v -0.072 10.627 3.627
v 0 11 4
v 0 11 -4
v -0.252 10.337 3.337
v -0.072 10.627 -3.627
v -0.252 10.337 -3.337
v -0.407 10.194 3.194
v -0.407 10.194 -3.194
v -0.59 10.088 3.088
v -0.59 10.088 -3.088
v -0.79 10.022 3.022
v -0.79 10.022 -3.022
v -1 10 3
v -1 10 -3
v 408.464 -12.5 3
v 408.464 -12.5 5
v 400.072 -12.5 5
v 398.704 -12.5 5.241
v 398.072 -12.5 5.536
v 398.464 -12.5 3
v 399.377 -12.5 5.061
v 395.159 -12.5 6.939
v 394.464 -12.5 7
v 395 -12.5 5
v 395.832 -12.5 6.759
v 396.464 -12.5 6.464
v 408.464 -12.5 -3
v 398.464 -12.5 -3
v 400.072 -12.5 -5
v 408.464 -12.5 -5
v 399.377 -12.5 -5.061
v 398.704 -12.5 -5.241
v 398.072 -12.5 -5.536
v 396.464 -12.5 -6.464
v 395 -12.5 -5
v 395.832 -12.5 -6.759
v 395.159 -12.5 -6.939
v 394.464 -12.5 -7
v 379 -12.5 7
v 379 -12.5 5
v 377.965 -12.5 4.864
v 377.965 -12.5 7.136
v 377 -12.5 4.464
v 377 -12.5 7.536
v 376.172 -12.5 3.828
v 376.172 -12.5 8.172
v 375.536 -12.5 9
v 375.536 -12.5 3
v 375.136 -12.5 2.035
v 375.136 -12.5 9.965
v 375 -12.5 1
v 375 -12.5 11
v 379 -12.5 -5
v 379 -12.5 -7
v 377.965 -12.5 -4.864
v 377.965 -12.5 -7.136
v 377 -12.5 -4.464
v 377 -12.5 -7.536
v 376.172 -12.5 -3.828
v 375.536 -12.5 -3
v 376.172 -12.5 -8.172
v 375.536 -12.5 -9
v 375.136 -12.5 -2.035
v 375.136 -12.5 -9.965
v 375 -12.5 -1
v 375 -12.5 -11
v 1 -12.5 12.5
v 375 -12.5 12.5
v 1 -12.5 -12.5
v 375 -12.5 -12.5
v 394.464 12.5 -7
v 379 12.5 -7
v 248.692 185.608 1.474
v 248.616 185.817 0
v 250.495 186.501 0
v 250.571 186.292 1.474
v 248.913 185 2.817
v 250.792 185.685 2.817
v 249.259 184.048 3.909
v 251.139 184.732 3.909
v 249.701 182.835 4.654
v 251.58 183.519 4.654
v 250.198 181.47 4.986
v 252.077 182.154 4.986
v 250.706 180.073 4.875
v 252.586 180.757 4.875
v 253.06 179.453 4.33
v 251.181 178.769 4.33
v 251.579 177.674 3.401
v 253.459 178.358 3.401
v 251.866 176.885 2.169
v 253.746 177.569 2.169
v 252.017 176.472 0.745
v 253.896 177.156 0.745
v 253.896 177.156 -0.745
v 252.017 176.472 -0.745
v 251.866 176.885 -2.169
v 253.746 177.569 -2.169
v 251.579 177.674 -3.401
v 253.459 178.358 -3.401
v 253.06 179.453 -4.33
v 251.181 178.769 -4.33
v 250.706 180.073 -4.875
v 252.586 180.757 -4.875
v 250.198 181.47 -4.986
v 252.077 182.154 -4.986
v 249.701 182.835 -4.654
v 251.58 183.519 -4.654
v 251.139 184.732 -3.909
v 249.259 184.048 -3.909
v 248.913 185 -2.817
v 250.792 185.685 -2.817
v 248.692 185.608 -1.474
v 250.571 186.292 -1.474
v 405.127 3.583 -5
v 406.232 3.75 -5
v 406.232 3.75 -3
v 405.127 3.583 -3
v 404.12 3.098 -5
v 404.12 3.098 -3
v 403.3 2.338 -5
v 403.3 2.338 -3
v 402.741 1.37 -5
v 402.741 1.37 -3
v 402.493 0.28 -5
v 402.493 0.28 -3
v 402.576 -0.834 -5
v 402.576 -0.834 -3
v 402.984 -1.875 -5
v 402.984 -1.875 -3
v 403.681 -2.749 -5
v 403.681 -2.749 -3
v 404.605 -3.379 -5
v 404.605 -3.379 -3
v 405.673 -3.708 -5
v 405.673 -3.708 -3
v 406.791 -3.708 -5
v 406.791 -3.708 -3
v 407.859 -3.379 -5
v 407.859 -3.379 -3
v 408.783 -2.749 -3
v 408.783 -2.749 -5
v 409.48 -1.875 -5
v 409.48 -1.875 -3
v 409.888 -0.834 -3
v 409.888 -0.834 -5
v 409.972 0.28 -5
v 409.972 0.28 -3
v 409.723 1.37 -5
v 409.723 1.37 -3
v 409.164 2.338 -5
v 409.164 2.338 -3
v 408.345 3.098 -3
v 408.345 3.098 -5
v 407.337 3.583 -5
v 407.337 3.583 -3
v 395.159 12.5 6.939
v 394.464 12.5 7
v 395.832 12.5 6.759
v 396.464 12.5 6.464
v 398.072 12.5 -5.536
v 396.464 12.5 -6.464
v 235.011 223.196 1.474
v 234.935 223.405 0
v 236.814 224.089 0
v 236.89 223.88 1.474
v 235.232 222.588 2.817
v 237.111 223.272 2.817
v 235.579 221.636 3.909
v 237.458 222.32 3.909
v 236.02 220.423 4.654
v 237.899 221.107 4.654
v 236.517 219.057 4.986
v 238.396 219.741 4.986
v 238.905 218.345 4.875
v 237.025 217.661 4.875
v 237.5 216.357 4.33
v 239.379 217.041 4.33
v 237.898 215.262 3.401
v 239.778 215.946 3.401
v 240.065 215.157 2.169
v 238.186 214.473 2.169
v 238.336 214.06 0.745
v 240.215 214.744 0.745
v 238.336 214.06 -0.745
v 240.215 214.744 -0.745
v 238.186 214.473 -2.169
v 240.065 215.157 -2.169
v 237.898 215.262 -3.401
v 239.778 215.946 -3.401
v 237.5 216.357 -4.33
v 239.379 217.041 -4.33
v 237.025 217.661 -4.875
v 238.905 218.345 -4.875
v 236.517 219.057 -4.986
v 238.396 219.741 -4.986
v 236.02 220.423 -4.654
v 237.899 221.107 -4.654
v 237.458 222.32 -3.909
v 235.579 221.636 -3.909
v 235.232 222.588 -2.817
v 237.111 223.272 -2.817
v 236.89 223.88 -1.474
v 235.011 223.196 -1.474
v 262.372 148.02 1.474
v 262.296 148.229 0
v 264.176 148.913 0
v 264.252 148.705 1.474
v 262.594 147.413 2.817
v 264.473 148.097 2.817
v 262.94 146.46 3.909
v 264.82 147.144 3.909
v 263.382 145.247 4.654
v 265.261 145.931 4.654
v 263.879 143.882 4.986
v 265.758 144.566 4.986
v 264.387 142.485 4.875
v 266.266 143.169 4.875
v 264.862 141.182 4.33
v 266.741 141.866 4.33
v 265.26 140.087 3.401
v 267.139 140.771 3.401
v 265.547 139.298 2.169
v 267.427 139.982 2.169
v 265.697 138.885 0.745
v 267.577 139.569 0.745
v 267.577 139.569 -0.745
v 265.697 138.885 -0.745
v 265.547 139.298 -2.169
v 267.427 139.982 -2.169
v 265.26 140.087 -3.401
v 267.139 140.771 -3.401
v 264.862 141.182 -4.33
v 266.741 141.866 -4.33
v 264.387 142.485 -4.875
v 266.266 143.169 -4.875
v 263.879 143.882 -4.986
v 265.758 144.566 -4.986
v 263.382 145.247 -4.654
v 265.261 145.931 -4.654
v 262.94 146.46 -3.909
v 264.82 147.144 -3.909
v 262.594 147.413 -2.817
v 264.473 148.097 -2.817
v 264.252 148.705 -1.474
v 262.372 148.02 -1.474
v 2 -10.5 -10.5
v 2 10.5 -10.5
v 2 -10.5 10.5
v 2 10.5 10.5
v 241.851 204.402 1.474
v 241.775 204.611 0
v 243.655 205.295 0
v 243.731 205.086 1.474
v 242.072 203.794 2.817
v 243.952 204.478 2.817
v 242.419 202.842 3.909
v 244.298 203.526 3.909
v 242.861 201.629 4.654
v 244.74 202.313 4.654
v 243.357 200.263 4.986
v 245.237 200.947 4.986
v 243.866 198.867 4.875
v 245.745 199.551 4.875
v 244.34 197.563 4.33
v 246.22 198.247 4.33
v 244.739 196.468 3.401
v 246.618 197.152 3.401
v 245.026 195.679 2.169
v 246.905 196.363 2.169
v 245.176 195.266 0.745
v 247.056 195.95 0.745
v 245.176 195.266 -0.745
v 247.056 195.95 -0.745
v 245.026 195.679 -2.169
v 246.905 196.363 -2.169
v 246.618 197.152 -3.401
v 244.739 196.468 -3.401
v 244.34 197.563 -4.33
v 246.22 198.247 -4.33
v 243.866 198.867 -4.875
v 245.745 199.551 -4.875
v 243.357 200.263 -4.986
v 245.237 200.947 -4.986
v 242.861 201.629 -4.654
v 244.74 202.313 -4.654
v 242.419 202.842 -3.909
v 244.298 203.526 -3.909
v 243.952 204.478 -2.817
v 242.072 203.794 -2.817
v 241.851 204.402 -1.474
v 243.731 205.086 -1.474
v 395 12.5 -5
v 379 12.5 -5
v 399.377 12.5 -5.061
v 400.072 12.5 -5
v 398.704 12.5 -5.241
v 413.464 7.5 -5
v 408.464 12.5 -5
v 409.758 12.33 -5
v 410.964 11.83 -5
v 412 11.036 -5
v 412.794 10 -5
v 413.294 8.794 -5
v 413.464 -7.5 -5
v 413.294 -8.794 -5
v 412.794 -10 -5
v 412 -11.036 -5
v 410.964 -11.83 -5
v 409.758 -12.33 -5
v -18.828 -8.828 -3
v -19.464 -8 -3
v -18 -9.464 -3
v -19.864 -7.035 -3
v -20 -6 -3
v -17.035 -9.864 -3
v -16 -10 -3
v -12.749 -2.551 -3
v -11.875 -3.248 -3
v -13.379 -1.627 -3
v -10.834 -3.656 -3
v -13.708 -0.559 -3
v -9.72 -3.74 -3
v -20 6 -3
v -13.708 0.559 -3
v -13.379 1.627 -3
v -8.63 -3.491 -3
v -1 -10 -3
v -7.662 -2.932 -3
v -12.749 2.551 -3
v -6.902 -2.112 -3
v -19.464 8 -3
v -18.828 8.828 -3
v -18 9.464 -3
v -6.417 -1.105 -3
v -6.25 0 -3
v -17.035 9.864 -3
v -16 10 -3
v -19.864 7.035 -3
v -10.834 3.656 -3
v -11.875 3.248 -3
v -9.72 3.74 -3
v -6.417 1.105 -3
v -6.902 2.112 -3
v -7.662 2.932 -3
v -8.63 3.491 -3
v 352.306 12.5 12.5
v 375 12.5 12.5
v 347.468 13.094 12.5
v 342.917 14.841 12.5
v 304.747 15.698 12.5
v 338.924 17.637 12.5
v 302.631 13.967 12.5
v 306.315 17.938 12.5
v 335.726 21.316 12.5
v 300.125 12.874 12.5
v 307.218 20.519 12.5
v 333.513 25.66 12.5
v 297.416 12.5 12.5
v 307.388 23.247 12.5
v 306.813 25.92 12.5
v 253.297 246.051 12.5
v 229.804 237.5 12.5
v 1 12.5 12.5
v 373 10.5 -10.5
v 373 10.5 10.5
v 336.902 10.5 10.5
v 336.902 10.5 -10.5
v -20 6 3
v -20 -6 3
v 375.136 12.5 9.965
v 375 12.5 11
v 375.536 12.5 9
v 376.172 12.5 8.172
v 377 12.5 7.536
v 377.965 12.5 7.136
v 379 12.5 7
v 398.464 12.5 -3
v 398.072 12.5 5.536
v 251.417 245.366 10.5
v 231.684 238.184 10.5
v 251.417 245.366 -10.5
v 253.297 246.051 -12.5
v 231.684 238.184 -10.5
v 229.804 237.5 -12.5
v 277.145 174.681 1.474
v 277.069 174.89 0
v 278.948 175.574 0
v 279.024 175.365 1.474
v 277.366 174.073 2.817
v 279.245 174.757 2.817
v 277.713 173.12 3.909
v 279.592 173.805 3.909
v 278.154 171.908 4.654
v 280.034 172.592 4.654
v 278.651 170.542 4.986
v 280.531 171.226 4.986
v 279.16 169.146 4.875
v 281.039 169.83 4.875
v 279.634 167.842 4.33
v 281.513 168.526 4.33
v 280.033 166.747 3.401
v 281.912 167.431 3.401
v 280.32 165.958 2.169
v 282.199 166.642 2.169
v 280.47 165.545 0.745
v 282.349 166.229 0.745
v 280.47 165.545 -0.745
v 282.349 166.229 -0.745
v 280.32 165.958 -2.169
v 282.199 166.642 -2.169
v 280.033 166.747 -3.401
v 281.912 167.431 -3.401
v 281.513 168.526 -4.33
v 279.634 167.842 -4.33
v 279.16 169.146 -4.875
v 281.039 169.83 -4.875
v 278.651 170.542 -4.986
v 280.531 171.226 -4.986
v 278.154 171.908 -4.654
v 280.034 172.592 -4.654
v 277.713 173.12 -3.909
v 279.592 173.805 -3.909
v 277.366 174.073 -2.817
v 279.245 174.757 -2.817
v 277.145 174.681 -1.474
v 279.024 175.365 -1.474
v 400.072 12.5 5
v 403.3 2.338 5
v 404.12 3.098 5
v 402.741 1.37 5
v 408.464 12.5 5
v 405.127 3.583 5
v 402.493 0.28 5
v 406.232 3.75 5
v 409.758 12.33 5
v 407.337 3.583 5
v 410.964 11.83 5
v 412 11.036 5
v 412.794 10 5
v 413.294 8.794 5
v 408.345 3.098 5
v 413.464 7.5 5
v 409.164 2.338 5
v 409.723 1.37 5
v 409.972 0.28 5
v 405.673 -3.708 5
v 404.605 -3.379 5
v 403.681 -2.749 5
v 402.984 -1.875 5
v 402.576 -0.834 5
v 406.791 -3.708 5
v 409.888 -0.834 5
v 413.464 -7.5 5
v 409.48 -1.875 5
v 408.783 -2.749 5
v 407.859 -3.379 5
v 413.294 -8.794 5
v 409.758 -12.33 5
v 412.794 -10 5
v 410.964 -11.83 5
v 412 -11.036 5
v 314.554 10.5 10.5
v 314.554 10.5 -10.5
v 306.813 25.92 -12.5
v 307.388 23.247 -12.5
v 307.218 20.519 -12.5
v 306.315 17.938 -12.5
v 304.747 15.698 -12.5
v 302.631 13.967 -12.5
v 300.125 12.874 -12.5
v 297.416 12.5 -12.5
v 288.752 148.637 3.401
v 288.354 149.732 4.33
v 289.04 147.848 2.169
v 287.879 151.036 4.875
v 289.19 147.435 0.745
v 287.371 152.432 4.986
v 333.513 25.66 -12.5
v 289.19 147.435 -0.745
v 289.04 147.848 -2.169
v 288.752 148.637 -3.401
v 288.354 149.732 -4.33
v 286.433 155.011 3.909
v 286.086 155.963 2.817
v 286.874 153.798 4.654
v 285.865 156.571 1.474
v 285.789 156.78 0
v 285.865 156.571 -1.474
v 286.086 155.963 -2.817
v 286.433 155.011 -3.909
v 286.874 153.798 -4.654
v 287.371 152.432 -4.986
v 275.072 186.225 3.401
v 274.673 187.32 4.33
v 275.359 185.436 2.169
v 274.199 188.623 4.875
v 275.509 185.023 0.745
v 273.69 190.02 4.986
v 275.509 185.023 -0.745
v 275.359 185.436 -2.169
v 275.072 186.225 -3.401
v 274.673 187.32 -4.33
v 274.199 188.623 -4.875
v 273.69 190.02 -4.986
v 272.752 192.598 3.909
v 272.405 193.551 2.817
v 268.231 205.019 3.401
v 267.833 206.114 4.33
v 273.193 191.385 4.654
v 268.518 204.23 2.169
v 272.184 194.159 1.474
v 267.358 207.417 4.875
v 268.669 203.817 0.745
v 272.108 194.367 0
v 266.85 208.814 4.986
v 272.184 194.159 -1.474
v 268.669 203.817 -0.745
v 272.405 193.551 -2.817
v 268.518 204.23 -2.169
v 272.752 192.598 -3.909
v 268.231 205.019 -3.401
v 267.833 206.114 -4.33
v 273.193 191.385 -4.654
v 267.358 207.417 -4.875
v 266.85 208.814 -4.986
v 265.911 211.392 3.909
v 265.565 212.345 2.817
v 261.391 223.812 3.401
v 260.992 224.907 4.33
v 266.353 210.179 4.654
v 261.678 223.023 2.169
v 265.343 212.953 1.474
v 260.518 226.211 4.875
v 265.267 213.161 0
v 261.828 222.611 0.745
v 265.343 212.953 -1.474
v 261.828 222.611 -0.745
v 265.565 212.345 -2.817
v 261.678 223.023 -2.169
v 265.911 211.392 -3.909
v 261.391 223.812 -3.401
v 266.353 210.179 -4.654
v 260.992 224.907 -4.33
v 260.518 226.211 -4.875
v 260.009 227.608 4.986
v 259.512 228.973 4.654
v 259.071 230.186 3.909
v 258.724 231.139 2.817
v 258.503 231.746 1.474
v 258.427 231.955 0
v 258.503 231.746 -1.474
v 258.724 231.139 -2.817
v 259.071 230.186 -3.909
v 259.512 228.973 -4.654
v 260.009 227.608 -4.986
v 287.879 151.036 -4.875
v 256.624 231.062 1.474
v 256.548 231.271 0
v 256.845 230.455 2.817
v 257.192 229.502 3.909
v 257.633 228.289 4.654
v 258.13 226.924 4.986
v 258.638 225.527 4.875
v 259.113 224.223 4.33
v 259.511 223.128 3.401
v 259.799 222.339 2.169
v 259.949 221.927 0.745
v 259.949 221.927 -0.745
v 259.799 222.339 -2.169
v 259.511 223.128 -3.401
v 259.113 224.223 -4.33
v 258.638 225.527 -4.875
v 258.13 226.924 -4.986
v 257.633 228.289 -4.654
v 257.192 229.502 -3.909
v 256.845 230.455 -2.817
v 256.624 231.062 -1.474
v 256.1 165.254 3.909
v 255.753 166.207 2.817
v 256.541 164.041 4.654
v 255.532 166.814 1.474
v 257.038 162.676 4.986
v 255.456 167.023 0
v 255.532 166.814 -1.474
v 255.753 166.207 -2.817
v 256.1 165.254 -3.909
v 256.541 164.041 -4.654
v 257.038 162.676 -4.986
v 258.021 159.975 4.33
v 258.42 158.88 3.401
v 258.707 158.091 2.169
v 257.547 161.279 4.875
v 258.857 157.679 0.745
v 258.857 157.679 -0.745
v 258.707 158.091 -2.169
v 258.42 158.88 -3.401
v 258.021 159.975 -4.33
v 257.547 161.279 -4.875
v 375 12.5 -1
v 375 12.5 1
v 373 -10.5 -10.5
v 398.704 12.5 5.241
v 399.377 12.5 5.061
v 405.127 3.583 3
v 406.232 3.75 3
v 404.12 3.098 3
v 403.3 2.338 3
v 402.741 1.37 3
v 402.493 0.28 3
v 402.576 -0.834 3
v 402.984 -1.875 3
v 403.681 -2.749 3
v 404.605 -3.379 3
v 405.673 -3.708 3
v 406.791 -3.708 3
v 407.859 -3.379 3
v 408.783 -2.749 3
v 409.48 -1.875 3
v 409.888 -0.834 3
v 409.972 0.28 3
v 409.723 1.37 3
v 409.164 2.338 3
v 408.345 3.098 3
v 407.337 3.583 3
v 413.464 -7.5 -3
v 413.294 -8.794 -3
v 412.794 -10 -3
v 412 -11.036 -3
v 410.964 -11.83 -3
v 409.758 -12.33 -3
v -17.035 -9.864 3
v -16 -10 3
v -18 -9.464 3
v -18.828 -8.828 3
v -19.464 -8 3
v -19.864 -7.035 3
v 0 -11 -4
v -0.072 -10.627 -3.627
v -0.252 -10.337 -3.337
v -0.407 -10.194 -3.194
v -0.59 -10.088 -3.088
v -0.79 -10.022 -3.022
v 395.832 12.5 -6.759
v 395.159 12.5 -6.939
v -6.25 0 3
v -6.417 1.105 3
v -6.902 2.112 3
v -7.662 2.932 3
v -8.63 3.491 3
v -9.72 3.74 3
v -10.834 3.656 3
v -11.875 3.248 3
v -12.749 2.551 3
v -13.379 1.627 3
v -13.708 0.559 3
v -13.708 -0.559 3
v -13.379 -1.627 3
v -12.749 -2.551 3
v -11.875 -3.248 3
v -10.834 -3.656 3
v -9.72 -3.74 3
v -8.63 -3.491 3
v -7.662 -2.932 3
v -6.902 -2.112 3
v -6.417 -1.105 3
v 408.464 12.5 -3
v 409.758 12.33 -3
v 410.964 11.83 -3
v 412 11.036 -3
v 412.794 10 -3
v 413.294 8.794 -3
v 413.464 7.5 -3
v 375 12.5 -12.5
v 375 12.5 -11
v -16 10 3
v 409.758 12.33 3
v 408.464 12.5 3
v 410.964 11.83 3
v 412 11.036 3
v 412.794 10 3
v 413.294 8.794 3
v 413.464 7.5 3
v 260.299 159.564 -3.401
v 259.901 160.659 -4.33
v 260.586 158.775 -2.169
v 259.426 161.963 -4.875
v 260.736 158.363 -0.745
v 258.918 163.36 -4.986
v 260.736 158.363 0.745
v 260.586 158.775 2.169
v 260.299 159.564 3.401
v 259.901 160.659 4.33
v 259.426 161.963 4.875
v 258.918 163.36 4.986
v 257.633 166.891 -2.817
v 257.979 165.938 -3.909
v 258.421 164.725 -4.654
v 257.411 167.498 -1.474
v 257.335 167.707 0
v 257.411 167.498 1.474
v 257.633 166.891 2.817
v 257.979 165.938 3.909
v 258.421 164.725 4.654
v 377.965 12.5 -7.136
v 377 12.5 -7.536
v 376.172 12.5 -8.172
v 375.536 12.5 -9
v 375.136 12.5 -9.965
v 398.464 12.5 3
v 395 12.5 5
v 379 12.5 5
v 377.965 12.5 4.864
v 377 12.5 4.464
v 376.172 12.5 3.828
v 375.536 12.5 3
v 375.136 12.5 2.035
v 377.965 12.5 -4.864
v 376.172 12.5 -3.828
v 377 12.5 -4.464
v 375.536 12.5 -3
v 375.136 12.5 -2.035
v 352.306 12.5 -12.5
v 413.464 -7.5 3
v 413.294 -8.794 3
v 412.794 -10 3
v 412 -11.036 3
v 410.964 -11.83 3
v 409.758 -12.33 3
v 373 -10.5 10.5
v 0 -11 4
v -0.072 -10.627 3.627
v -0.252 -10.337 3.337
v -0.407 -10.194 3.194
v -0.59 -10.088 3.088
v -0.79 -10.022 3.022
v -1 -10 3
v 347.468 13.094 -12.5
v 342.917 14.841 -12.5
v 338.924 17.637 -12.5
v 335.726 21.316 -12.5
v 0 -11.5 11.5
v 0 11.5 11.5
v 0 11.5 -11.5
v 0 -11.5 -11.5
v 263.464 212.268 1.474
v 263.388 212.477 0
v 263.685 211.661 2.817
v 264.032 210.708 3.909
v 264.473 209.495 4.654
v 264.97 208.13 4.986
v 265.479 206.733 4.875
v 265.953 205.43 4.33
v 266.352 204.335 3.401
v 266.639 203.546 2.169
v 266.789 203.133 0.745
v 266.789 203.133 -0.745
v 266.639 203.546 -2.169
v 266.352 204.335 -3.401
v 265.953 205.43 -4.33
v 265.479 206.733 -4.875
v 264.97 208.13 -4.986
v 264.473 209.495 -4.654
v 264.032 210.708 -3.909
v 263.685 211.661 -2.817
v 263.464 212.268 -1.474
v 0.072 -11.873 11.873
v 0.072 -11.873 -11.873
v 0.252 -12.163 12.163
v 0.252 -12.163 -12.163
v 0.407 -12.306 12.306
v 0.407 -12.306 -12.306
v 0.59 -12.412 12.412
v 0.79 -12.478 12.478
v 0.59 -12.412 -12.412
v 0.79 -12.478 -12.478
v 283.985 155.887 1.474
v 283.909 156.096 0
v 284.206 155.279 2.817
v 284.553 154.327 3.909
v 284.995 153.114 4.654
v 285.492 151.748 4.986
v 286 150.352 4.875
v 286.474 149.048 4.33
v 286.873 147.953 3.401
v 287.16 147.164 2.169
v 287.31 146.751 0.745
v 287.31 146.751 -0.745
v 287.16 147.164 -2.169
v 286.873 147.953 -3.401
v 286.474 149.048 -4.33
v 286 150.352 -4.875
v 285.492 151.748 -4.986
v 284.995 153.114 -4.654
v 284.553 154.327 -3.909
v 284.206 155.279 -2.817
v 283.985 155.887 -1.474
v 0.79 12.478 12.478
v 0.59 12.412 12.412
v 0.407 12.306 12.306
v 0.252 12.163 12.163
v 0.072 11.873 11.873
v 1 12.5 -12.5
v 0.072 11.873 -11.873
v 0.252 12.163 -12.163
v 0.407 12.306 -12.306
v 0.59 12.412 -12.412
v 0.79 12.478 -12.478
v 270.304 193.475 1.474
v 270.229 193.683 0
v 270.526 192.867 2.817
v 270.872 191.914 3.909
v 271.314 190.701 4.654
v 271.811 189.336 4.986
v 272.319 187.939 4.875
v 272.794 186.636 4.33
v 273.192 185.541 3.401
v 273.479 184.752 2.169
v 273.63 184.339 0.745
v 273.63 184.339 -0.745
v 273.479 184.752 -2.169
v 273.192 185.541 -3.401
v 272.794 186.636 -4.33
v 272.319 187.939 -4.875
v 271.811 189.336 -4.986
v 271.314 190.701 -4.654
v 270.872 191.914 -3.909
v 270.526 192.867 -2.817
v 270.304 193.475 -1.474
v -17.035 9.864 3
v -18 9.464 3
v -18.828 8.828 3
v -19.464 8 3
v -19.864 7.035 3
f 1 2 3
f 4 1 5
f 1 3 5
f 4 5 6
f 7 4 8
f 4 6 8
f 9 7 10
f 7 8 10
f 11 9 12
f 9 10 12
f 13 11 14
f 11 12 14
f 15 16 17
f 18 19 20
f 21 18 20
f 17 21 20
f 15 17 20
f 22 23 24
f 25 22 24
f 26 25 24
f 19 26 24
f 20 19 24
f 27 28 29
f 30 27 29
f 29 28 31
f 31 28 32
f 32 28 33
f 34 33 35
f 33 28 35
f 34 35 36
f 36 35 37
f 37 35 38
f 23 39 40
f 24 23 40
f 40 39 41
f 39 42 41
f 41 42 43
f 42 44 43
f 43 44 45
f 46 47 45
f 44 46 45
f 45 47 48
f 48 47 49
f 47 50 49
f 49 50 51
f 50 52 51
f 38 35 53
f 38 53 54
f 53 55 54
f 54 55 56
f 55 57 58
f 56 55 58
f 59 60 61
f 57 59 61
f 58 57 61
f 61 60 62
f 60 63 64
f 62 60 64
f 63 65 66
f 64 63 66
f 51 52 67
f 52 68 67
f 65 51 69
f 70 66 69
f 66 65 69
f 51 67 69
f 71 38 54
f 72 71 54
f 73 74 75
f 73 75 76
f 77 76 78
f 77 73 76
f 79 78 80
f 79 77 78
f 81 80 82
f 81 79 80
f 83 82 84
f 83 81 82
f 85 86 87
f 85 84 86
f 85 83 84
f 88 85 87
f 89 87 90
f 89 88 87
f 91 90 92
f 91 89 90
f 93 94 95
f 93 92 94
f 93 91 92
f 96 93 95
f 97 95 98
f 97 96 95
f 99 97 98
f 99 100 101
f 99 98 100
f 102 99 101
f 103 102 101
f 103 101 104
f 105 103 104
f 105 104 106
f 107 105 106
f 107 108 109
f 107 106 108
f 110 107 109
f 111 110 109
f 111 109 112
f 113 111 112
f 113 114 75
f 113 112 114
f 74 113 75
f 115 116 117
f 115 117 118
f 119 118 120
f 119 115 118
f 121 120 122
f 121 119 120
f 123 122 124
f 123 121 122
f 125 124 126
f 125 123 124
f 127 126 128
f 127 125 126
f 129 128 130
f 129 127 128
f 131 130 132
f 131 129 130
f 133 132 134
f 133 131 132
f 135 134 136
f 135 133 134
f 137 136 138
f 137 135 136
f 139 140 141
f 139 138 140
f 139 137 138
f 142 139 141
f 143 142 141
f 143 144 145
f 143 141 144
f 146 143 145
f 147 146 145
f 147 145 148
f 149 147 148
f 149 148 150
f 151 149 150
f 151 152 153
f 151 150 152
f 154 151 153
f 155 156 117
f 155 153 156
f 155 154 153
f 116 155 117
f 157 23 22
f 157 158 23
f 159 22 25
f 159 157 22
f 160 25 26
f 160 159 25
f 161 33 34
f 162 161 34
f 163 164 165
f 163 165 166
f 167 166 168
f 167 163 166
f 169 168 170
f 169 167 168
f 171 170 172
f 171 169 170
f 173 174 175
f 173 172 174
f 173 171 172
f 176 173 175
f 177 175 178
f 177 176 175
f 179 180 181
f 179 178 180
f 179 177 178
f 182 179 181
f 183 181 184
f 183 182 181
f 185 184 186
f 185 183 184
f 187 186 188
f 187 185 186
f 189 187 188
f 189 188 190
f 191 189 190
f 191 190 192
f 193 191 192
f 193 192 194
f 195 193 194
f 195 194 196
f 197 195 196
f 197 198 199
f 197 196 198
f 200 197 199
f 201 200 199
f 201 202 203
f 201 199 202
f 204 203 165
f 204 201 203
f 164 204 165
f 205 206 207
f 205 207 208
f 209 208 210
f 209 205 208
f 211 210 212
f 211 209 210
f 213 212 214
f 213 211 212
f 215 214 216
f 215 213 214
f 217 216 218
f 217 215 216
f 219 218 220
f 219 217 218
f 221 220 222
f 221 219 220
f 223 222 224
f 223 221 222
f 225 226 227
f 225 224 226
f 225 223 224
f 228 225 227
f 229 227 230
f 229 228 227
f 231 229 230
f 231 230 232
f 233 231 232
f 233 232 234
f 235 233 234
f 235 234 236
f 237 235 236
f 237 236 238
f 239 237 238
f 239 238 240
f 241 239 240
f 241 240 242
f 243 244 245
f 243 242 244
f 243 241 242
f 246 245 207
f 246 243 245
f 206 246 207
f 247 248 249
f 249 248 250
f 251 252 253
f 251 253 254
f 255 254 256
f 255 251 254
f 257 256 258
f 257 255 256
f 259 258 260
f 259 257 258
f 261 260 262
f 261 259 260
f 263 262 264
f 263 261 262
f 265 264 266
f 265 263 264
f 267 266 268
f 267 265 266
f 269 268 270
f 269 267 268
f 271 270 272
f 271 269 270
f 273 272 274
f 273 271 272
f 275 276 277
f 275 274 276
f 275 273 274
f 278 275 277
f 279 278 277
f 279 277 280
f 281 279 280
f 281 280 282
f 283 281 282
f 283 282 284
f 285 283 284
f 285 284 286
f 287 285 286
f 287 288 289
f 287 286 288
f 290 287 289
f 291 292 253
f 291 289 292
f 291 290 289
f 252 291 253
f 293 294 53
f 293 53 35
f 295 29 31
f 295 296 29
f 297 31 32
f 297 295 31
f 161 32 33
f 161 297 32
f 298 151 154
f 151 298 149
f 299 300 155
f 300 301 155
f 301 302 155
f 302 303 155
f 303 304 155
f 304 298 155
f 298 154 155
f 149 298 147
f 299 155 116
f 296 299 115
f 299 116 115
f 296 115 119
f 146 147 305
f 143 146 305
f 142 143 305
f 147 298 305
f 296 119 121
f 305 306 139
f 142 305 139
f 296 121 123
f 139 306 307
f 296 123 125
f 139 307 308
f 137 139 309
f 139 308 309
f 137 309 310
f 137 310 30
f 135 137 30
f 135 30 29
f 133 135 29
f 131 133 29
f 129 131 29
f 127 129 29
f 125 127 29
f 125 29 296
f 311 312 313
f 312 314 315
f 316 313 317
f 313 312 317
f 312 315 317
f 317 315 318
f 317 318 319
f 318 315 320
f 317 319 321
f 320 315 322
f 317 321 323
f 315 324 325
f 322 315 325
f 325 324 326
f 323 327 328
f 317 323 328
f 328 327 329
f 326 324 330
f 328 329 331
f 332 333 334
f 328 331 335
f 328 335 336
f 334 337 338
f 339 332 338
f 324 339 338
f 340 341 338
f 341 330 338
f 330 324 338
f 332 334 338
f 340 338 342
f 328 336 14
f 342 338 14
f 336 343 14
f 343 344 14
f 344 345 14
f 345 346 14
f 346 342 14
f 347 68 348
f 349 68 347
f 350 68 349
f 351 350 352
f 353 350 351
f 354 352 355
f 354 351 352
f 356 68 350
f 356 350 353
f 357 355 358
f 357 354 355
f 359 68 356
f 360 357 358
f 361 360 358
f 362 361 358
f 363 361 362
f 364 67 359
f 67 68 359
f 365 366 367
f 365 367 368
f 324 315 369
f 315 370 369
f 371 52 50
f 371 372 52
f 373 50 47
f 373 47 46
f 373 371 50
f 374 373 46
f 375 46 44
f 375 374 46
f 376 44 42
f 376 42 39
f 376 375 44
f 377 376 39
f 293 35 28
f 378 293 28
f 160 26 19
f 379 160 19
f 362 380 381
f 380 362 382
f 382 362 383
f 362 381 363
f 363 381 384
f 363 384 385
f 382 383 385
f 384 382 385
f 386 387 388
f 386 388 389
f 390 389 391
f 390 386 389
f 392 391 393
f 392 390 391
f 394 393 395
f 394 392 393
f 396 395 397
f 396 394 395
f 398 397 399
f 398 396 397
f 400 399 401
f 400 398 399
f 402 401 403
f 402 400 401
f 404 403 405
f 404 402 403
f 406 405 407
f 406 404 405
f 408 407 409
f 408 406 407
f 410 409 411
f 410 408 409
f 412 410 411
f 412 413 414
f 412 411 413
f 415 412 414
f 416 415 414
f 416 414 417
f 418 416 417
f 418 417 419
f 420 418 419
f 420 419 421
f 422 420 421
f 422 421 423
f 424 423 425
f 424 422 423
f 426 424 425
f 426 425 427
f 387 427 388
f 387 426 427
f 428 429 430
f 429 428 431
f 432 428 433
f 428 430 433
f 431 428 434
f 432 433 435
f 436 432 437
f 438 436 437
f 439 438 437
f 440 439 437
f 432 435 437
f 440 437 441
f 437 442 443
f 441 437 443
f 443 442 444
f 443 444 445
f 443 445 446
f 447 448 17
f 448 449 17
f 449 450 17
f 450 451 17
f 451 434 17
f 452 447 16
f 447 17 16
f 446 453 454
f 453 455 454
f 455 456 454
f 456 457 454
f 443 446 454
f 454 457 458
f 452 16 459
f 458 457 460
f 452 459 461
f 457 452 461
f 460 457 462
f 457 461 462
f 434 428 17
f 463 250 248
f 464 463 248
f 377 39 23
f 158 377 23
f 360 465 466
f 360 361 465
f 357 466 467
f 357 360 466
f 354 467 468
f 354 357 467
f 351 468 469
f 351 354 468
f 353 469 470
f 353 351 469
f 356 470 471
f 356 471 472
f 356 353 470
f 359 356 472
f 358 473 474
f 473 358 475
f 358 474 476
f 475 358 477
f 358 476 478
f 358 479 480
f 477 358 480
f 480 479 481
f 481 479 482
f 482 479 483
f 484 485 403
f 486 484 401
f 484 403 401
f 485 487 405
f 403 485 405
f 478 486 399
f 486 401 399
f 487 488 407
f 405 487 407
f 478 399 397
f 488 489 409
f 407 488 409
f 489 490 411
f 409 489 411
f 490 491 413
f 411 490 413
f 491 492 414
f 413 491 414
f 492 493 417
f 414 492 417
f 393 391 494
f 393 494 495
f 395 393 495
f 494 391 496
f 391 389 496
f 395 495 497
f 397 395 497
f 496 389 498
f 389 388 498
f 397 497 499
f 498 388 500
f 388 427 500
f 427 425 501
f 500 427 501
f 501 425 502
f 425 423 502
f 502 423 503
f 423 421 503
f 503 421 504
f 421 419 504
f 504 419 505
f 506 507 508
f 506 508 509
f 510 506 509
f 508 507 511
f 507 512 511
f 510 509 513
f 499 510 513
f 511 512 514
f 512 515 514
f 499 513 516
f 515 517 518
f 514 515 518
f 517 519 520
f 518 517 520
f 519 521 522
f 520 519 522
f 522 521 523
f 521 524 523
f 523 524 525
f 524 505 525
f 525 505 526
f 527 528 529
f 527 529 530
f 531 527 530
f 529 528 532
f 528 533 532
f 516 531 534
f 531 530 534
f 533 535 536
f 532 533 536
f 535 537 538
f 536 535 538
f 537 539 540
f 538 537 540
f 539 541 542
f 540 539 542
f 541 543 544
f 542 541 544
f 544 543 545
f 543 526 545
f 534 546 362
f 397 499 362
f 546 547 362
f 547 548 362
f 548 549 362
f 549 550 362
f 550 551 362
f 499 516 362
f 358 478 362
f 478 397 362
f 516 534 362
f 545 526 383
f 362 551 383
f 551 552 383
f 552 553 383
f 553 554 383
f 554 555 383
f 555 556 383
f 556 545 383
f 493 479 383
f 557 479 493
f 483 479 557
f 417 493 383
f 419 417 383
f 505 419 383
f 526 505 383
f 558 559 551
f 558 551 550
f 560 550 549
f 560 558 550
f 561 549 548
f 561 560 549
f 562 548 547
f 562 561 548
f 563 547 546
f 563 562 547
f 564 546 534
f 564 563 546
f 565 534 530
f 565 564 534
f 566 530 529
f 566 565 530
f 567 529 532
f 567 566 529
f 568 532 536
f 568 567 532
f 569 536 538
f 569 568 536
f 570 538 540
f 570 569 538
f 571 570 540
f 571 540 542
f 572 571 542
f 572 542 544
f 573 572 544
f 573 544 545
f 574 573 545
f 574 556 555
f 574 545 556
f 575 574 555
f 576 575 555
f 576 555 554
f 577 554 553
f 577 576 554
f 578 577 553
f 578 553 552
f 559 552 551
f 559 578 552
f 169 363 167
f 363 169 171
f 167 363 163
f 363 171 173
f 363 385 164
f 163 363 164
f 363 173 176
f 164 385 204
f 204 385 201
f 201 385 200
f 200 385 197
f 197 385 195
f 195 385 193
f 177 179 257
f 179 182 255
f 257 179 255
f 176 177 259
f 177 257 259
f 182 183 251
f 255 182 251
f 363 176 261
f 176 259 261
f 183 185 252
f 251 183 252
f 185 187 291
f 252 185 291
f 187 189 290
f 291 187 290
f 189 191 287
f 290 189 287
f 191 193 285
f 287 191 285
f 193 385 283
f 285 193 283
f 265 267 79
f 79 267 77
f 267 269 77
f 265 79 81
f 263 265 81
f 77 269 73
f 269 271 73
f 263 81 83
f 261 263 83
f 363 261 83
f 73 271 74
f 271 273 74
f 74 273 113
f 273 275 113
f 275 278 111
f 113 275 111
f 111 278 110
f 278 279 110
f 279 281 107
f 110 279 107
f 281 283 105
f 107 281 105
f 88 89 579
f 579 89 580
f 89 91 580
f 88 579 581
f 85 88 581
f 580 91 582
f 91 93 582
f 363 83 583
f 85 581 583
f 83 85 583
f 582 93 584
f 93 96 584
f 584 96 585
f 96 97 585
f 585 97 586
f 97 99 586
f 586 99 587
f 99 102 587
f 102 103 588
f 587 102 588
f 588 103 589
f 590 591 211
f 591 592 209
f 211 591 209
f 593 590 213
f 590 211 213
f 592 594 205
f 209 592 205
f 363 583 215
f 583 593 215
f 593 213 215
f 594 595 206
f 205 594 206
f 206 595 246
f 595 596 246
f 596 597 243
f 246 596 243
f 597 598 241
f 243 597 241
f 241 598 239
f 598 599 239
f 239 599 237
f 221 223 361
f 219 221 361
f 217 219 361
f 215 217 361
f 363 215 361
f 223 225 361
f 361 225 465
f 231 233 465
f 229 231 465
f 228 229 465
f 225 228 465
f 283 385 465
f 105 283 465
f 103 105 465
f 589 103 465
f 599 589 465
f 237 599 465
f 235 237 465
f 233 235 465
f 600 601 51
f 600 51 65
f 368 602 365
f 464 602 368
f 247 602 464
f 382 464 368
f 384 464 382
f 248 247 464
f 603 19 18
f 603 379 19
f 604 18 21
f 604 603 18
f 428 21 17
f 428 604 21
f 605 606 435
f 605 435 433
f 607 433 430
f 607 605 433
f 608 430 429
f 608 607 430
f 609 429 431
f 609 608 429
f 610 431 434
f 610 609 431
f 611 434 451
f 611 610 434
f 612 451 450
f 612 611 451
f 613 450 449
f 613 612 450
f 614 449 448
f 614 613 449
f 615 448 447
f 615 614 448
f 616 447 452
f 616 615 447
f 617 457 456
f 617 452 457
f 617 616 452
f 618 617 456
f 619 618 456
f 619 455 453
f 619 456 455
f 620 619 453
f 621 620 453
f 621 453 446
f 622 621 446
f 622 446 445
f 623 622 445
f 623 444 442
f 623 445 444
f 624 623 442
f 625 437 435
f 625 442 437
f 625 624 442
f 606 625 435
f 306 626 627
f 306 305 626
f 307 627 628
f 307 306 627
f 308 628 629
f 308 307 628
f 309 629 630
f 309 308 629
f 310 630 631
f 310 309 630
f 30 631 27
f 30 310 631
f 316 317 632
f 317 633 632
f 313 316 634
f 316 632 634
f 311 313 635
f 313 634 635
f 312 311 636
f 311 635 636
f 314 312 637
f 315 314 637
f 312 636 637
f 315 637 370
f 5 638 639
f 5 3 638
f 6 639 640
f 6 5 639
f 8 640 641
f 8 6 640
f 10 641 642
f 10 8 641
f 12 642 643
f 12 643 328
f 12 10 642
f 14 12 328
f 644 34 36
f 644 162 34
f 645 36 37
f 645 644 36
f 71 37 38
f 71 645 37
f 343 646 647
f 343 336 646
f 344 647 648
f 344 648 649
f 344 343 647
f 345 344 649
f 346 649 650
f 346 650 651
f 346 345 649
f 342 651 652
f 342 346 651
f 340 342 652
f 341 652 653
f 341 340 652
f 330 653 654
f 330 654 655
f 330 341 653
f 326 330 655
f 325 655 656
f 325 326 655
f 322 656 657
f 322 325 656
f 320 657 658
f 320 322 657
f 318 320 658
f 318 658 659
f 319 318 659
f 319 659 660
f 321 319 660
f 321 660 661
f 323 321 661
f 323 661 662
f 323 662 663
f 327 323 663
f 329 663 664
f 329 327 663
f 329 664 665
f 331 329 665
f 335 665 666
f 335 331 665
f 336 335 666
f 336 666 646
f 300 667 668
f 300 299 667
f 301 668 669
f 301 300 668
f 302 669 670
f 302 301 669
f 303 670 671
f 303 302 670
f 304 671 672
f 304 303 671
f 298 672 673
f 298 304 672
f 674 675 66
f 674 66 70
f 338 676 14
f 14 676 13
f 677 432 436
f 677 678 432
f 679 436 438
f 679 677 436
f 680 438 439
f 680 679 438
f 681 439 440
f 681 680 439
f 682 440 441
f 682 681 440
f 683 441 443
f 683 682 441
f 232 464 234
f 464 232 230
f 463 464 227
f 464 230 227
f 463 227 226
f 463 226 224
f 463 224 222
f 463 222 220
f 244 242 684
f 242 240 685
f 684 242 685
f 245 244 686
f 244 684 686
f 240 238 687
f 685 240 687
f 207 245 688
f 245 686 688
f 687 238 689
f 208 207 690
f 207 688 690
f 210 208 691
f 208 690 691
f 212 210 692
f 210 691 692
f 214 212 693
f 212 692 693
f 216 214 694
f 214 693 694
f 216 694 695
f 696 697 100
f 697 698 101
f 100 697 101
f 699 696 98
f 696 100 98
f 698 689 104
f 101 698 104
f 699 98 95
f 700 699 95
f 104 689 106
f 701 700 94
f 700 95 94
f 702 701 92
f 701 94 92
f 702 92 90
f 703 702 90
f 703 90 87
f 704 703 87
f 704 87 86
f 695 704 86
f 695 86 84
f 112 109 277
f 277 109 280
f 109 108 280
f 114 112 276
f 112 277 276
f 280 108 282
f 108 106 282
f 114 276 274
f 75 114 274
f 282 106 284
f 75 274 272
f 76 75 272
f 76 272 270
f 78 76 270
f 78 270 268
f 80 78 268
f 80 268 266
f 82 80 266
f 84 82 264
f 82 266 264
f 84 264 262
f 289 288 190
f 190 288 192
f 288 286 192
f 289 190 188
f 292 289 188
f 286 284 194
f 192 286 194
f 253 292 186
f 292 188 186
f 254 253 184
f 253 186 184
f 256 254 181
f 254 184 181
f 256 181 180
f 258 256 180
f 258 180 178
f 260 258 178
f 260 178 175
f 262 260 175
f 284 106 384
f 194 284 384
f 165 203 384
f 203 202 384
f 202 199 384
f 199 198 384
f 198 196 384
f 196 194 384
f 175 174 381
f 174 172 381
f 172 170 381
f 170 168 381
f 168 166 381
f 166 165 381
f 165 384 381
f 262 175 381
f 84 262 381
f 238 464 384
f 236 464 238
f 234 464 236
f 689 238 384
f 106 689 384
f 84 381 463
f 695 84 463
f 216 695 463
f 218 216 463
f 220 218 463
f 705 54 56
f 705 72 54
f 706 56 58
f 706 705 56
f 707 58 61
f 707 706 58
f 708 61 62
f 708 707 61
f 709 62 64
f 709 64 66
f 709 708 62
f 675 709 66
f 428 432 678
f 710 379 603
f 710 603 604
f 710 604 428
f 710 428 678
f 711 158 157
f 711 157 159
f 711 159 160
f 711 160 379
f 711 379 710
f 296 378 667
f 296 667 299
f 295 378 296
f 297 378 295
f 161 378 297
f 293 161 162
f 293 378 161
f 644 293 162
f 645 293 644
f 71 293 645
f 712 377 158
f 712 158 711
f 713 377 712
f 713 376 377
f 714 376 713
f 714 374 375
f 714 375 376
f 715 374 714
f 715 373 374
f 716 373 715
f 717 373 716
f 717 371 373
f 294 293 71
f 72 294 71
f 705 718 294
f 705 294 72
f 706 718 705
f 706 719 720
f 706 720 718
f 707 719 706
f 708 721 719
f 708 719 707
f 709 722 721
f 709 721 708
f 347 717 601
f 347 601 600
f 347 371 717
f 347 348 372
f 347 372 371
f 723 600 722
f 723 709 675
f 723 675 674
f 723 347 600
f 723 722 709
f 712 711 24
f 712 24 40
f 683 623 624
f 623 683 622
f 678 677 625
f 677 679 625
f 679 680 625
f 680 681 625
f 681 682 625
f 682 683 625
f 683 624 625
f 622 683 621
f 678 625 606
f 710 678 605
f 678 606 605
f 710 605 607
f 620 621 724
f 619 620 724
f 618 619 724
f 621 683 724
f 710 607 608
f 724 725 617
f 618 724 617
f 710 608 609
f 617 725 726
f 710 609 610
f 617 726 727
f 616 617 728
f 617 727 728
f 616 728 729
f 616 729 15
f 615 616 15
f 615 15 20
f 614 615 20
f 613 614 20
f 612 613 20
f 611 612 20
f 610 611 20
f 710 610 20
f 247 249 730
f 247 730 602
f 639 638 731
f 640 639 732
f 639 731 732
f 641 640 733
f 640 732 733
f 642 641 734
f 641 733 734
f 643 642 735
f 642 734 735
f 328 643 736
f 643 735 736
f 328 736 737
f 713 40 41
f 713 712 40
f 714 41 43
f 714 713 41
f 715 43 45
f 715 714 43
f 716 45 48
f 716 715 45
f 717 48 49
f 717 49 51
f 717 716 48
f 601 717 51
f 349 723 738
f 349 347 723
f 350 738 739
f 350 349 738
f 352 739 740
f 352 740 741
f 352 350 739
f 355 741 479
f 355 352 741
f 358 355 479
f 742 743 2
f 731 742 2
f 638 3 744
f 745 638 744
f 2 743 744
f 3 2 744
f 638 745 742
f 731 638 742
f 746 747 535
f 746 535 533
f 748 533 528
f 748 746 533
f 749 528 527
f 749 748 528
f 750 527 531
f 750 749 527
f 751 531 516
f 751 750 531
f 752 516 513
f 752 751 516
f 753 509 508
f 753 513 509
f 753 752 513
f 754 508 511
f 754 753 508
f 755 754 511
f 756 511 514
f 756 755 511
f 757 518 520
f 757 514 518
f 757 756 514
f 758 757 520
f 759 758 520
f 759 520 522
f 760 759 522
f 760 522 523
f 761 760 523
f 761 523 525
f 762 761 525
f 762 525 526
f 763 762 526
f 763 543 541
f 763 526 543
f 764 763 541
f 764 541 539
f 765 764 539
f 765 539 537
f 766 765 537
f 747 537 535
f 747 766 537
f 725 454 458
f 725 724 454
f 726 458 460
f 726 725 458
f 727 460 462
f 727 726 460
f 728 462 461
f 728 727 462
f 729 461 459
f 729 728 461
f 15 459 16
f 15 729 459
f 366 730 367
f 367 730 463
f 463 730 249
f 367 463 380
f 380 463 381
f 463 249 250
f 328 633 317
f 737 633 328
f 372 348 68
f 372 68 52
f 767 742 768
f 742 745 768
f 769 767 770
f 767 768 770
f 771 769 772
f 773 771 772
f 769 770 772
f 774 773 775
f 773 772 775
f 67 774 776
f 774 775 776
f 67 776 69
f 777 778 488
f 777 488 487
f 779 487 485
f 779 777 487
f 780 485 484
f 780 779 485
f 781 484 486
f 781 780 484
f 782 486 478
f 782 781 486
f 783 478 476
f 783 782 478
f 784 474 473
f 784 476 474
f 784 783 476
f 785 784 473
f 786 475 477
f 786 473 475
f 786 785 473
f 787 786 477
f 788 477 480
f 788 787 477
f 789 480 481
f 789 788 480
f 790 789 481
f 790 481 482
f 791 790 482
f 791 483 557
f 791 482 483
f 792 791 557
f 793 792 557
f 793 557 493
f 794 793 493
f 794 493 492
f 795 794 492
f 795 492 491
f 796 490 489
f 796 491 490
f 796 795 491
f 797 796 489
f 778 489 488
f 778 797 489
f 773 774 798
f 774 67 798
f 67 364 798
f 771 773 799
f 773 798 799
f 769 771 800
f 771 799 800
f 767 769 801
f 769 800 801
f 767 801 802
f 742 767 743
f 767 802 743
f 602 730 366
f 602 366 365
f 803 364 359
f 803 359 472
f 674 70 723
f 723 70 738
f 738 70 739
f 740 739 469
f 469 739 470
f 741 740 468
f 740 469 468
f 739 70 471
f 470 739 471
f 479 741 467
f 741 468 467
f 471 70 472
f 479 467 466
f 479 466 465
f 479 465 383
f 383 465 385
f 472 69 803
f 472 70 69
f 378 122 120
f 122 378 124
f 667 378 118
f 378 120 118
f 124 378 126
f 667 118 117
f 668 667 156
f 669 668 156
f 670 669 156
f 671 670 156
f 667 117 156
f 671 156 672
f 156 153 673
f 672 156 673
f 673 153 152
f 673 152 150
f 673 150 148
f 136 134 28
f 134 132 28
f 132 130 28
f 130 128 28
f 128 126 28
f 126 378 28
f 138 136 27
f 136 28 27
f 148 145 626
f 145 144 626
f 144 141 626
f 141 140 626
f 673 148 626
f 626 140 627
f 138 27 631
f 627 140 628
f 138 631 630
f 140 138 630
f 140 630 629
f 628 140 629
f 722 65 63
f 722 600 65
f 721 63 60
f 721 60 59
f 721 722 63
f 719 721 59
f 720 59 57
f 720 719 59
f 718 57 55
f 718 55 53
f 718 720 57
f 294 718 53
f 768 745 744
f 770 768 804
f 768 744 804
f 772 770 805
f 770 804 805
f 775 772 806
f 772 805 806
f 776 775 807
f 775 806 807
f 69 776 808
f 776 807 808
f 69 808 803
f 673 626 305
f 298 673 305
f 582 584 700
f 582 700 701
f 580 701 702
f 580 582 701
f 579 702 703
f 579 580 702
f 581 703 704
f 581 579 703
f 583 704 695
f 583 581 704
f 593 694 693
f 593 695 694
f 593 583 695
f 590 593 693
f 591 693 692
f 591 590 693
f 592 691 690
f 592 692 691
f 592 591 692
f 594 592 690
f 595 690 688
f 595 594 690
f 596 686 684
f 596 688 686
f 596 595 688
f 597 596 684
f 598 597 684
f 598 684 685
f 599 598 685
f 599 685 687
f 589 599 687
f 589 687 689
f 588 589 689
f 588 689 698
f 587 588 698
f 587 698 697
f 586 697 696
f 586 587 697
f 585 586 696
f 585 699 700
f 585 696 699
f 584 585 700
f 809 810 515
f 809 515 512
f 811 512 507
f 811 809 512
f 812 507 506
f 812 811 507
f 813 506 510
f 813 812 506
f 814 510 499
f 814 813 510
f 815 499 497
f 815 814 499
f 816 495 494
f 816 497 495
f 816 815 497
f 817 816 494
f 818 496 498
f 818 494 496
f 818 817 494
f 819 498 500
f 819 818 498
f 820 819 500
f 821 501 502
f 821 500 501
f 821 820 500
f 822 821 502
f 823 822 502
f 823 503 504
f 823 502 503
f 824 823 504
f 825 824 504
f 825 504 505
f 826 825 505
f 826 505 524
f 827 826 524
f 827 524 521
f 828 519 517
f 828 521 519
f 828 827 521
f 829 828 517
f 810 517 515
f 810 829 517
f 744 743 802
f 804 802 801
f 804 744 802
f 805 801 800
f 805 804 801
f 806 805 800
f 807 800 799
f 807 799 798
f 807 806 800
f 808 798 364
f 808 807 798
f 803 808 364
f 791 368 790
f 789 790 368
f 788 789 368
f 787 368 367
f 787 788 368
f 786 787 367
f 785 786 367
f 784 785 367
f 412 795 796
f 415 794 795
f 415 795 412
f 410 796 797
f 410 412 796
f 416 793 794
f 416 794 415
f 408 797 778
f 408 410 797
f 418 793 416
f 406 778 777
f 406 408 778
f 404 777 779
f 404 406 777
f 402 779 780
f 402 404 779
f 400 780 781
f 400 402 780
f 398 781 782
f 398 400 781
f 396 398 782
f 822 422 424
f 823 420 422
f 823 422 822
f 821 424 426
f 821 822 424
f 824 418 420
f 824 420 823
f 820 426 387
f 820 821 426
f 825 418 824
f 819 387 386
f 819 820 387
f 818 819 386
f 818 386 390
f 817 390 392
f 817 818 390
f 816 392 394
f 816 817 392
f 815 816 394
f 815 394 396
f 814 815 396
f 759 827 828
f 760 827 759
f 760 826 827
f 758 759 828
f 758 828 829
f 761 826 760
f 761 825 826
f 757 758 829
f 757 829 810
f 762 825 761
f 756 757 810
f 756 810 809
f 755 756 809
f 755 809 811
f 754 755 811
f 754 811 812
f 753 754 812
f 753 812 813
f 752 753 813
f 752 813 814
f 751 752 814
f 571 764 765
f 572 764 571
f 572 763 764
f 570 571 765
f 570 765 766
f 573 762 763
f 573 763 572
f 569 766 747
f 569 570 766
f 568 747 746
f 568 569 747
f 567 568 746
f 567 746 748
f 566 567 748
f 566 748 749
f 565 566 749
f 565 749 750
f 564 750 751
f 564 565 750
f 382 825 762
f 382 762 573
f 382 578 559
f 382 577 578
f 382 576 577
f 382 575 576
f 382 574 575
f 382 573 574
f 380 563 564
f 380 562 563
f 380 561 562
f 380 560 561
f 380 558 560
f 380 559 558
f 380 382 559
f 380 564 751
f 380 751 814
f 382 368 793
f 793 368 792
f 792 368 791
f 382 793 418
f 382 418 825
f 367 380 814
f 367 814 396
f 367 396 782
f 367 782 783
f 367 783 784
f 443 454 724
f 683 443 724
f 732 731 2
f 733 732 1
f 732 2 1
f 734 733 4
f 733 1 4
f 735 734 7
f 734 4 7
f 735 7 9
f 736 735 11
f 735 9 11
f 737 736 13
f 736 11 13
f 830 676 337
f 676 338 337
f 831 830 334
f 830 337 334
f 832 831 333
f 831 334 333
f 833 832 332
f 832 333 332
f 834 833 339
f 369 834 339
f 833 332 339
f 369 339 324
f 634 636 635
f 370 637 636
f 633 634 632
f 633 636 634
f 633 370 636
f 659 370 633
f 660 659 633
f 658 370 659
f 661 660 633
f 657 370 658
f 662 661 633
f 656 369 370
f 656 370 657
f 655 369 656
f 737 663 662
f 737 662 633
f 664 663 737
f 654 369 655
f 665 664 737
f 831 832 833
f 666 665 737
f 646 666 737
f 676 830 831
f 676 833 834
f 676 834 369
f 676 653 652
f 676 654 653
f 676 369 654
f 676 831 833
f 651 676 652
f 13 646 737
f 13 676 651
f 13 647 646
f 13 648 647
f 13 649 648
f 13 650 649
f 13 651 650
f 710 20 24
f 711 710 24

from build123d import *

# Parameters (mm, degrees)
SKETCH1_W                = 25
SKETCH1_H                = 25
SKETCH1_W_2              = 21
SKETCH1_H_2              = 21
BOSS_EXTRUDE1_DEPTH      = 375
SKETCH2_W                = 25
SKETCH2_H                = 25
BOSS_EXTRUDE2_DEPTH      = 2
SKETCH3_W                = 20
SKETCH3_H                = 20
SKETCH3_R                = 3.75
BOSS_EXTRUDE3_DEPTH      = 3
FILLET1_R                = 1
FILLET2_R                = 4
BOSS_EXTRUDE4_DEPTH      = 12.5
BOSS_EXTRUDE4_DEPTH_BACK = 12.5
CUT_EXTRUDE1_REACH       = 451.804
SKETCH5_W                = 21
SKETCH5_H                = 21
FILLET3_R                = 20
FILLET4_R                = 10
SKETCH6_W                = 25
SKETCH6_H                = 25
BOSS_EXTRUDE5_DEPTH      = 2
THICKEN1_START           = -12.5
THICKEN1_DEPTH           = 25
THICKEN2_START           = -12.5
THICKEN2_DEPTH           = 25
CUT_EXTRUDE2_DEPTH       = 482.455775371
CUT_EXTRUDE2_DEPTH_BACK  = 482.455775371
SKETCH9_R                = 3.75
FILLET6_R                = 4
FILLET7_R                = 5
CUT_EXTRUDE3_DEPTH       = 351.398422086
CUT_EXTRUDE3_DEPTH_BACK  = 351.398422086
SKETCH10_R               = 5


# Read off the part's stored shape, not the designer's step: Thicken1, Thicken2
with BuildPart() as part:
    # Sketch1 → Boss-Extrude1 (new body)
    with BuildSketch(Plane(origin=(0, 0, 0), x_dir=(0, 0, -1), z_dir=(1, 0, 0))):
        Rectangle(SKETCH1_W, SKETCH1_H)
        Rectangle(SKETCH1_W_2, SKETCH1_H_2, mode=Mode.SUBTRACT)
    extrude(amount=BOSS_EXTRUDE1_DEPTH)

    # Sketch2 → Boss-Extrude2 (add)
    with BuildSketch(Plane.ZY):
        Rectangle(SKETCH2_W, SKETCH2_H)
    extrude(amount=-BOSS_EXTRUDE2_DEPTH)

    # Sketch3 → Boss-Extrude3 (add, symmetric)
    with BuildSketch(Plane.XY):
        with Locations((-10, 0)):
            Rectangle(SKETCH3_W, SKETCH3_H)
        with Locations((-10, 0)):
            Circle(SKETCH3_R, mode=Mode.SUBTRACT)
    extrude(amount=BOSS_EXTRUDE3_DEPTH, both=True)

    # Fillet1
    fillet1_edges = [part.edges().sort_by_distance(p)[0] for p in [
        (0, 12.5, 0),
        (0, 0, -12.5),
        (0, 0, 3),
        (0, 0, -3),
        (0, -10, 0),
        (0, 10, 0),
        (0, -12.5, 0),
        (0, 0, 12.5),
    ]]
    fillet(fillet1_edges, radius=FILLET1_R)

    # Fillet2
    fillet2_edges = [part.edges().sort_by_distance(p)[0] for p in [
        (-20, 10, 0),
        (-20, -10, 0),
    ]]
    fillet(fillet2_edges, radius=FILLET2_R)

    # Sketch4 → Boss-Extrude4 (add, two sides: drawn at the far end of the back side and taken through both)
    with BuildSketch(Plane.XY.offset(-BOSS_EXTRUDE4_DEPTH_BACK)):
        Polygon((338.302222156, 12.5), (253.296790654, 246.050503583), (229.804475134, 237.5), (311.697777844, 12.5), align=None)
    extrude(amount=BOSS_EXTRUDE4_DEPTH + BOSS_EXTRUDE4_DEPTH_BACK)

    # Cut-Extrude1: up to this plane
    cut_extrude1_end = Plane(origin=(375, 10.5, -10.5), z_dir=(0, -1, 0))
    # Sketch5 → Cut-Extrude1 (cut, up to the surface)
    with BuildSketch(Plane(origin=(-49.449011673, 135.860042987, 0), x_dir=(0, 0, 1), z_dir=(-0.3420201433256653, 0.9396926207859098, 0)), mode=Mode.PRIVATE) as cut_extrude1_sk1:
        with Locations((0, 309.675353547)):
            Rectangle(SKETCH5_W, SKETCH5_H)
    cut_extrude1_tool1 = split(extrude(cut_extrude1_sk1.sketch, amount=-CUT_EXTRUDE1_REACH, mode=Mode.PRIVATE), bisect_by=cut_extrude1_end, keep=Keep.BOTH, mode=Mode.PRIVATE)
    add(cut_extrude1_tool1.solids().sort_by_distance((241.550633, 241.775252, 0))[0], mode=Mode.SUBTRACT)

    # Fillet3
    fillet3_edges = [part.edges().sort_by_distance(p)[0] for p in [
        (338.302222156, 12.5, 0),
    ]]
    fillet(fillet3_edges, radius=FILLET3_R)

    # Fillet4
    fillet4_edges = [part.edges().sort_by_distance(p)[0] for p in [
        (311.697777844, 12.5, 0),
    ]]
    fillet(fillet4_edges, radius=FILLET4_R)

    # Sketch6 → Boss-Extrude5 (add)
    with BuildSketch(Plane(origin=(375, 0, 0), x_dir=(0, 0, -1), z_dir=(1, 0, 0))):
        Rectangle(SKETCH6_W, SKETCH6_H)
    extrude(amount=-BOSS_EXTRUDE5_DEPTH)

    # Thicken1 outline → Thicken1 (add)
    with BuildSketch(Plane(origin=(0, 0, 0), x_dir=(1, 0, 0), z_dir=(0, 1, 0)).offset(THICKEN1_START)):
        Polygon((398.464101615, 3), (413.464101615, 3), (413.464101615, 5), (399, 5), (395.535898385, 7), (375, 7), (375, 5), (395, 5), align=None)
    extrude(amount=THICKEN1_DEPTH)

    # Thicken2 outline → Thicken2 (add)
    with BuildSketch(Plane(origin=(0, 0, 0), x_dir=(1, 0, 0), z_dir=(0, 1, 0)).offset(THICKEN2_START)):
        Polygon((399, -5), (413.464101615, -5), (413.464101615, -3), (398.464101615, -3), (395, -5), (375, -5), (375, -7), (395.535898385, -7), align=None)
    extrude(amount=THICKEN2_DEPTH)

    # Sketch9 → Cut-Extrude2 (cut, two sides: drawn at the far end of the back side and taken through both)
    with BuildSketch(Plane.XY.offset(5).offset(-CUT_EXTRUDE2_DEPTH_BACK)):
        with Locations(Location((406.232050808, 0, 0), (0, 0, 90))):
            Circle(SKETCH9_R)
    extrude(amount=CUT_EXTRUDE2_DEPTH + CUT_EXTRUDE2_DEPTH_BACK, mode=Mode.SUBTRACT)

    # Fillet6
    fillet6_edges = [part.edges().sort_by_distance(p)[0] for p in [
        (375, 0, -7),
        (395.535898385, 0, -7),
        (399, 0, -5),
        (375, 0, -5),
        (375, 0, 5),
        (375, 0, 7),
        (395.535898385, 0, 7),
        (399, 0, 5),
    ]]
    fillet(fillet6_edges, radius=FILLET6_R)

    # Fillet7
    fillet7_edges = [part.edges().sort_by_distance(p)[0] for p in [
        (413.464101615, 12.5, -4),
        (413.464101615, -12.5, -4),
        (413.464101615, 12.5, 4),
        (413.464101615, -12.5, 4),
    ]]
    fillet(fillet7_edges, radius=FILLET7_R)

    # Sketch10 → Cut-Extrude3 (cut, two sides: drawn at the far end of the back side and taken through both)
    with BuildSketch(Plane(origin=(302.745802327, 110.190460596, 0), x_dir=(0, 0, -1), z_dir=(0.9396926207859093, 0.34202014332566627, 0)).offset(-CUT_EXTRUDE3_DEPTH_BACK)):
        with Locations(Location((0, 124.579237914, 0), (0, 0, 90))):
            Circle(SKETCH10_R)
        with Locations(Location((0, 104.579237914, 0), (0, 0, 90))):
            Circle(SKETCH10_R)
        with Locations(Location((0, 84.579237914, 0), (0, 0, 90))):
            Circle(SKETCH10_R)
        with Locations(Location((0, 64.579237914, 0), (0, 0, 90))):
            Circle(SKETCH10_R)
        with Locations(Location((0, 44.579237914, 0), (0, 0, 90))):
            Circle(SKETCH10_R)
    extrude(amount=CUT_EXTRUDE3_DEPTH + CUT_EXTRUDE3_DEPTH_BACK, mode=Mode.SUBTRACT)


solid = part.part
